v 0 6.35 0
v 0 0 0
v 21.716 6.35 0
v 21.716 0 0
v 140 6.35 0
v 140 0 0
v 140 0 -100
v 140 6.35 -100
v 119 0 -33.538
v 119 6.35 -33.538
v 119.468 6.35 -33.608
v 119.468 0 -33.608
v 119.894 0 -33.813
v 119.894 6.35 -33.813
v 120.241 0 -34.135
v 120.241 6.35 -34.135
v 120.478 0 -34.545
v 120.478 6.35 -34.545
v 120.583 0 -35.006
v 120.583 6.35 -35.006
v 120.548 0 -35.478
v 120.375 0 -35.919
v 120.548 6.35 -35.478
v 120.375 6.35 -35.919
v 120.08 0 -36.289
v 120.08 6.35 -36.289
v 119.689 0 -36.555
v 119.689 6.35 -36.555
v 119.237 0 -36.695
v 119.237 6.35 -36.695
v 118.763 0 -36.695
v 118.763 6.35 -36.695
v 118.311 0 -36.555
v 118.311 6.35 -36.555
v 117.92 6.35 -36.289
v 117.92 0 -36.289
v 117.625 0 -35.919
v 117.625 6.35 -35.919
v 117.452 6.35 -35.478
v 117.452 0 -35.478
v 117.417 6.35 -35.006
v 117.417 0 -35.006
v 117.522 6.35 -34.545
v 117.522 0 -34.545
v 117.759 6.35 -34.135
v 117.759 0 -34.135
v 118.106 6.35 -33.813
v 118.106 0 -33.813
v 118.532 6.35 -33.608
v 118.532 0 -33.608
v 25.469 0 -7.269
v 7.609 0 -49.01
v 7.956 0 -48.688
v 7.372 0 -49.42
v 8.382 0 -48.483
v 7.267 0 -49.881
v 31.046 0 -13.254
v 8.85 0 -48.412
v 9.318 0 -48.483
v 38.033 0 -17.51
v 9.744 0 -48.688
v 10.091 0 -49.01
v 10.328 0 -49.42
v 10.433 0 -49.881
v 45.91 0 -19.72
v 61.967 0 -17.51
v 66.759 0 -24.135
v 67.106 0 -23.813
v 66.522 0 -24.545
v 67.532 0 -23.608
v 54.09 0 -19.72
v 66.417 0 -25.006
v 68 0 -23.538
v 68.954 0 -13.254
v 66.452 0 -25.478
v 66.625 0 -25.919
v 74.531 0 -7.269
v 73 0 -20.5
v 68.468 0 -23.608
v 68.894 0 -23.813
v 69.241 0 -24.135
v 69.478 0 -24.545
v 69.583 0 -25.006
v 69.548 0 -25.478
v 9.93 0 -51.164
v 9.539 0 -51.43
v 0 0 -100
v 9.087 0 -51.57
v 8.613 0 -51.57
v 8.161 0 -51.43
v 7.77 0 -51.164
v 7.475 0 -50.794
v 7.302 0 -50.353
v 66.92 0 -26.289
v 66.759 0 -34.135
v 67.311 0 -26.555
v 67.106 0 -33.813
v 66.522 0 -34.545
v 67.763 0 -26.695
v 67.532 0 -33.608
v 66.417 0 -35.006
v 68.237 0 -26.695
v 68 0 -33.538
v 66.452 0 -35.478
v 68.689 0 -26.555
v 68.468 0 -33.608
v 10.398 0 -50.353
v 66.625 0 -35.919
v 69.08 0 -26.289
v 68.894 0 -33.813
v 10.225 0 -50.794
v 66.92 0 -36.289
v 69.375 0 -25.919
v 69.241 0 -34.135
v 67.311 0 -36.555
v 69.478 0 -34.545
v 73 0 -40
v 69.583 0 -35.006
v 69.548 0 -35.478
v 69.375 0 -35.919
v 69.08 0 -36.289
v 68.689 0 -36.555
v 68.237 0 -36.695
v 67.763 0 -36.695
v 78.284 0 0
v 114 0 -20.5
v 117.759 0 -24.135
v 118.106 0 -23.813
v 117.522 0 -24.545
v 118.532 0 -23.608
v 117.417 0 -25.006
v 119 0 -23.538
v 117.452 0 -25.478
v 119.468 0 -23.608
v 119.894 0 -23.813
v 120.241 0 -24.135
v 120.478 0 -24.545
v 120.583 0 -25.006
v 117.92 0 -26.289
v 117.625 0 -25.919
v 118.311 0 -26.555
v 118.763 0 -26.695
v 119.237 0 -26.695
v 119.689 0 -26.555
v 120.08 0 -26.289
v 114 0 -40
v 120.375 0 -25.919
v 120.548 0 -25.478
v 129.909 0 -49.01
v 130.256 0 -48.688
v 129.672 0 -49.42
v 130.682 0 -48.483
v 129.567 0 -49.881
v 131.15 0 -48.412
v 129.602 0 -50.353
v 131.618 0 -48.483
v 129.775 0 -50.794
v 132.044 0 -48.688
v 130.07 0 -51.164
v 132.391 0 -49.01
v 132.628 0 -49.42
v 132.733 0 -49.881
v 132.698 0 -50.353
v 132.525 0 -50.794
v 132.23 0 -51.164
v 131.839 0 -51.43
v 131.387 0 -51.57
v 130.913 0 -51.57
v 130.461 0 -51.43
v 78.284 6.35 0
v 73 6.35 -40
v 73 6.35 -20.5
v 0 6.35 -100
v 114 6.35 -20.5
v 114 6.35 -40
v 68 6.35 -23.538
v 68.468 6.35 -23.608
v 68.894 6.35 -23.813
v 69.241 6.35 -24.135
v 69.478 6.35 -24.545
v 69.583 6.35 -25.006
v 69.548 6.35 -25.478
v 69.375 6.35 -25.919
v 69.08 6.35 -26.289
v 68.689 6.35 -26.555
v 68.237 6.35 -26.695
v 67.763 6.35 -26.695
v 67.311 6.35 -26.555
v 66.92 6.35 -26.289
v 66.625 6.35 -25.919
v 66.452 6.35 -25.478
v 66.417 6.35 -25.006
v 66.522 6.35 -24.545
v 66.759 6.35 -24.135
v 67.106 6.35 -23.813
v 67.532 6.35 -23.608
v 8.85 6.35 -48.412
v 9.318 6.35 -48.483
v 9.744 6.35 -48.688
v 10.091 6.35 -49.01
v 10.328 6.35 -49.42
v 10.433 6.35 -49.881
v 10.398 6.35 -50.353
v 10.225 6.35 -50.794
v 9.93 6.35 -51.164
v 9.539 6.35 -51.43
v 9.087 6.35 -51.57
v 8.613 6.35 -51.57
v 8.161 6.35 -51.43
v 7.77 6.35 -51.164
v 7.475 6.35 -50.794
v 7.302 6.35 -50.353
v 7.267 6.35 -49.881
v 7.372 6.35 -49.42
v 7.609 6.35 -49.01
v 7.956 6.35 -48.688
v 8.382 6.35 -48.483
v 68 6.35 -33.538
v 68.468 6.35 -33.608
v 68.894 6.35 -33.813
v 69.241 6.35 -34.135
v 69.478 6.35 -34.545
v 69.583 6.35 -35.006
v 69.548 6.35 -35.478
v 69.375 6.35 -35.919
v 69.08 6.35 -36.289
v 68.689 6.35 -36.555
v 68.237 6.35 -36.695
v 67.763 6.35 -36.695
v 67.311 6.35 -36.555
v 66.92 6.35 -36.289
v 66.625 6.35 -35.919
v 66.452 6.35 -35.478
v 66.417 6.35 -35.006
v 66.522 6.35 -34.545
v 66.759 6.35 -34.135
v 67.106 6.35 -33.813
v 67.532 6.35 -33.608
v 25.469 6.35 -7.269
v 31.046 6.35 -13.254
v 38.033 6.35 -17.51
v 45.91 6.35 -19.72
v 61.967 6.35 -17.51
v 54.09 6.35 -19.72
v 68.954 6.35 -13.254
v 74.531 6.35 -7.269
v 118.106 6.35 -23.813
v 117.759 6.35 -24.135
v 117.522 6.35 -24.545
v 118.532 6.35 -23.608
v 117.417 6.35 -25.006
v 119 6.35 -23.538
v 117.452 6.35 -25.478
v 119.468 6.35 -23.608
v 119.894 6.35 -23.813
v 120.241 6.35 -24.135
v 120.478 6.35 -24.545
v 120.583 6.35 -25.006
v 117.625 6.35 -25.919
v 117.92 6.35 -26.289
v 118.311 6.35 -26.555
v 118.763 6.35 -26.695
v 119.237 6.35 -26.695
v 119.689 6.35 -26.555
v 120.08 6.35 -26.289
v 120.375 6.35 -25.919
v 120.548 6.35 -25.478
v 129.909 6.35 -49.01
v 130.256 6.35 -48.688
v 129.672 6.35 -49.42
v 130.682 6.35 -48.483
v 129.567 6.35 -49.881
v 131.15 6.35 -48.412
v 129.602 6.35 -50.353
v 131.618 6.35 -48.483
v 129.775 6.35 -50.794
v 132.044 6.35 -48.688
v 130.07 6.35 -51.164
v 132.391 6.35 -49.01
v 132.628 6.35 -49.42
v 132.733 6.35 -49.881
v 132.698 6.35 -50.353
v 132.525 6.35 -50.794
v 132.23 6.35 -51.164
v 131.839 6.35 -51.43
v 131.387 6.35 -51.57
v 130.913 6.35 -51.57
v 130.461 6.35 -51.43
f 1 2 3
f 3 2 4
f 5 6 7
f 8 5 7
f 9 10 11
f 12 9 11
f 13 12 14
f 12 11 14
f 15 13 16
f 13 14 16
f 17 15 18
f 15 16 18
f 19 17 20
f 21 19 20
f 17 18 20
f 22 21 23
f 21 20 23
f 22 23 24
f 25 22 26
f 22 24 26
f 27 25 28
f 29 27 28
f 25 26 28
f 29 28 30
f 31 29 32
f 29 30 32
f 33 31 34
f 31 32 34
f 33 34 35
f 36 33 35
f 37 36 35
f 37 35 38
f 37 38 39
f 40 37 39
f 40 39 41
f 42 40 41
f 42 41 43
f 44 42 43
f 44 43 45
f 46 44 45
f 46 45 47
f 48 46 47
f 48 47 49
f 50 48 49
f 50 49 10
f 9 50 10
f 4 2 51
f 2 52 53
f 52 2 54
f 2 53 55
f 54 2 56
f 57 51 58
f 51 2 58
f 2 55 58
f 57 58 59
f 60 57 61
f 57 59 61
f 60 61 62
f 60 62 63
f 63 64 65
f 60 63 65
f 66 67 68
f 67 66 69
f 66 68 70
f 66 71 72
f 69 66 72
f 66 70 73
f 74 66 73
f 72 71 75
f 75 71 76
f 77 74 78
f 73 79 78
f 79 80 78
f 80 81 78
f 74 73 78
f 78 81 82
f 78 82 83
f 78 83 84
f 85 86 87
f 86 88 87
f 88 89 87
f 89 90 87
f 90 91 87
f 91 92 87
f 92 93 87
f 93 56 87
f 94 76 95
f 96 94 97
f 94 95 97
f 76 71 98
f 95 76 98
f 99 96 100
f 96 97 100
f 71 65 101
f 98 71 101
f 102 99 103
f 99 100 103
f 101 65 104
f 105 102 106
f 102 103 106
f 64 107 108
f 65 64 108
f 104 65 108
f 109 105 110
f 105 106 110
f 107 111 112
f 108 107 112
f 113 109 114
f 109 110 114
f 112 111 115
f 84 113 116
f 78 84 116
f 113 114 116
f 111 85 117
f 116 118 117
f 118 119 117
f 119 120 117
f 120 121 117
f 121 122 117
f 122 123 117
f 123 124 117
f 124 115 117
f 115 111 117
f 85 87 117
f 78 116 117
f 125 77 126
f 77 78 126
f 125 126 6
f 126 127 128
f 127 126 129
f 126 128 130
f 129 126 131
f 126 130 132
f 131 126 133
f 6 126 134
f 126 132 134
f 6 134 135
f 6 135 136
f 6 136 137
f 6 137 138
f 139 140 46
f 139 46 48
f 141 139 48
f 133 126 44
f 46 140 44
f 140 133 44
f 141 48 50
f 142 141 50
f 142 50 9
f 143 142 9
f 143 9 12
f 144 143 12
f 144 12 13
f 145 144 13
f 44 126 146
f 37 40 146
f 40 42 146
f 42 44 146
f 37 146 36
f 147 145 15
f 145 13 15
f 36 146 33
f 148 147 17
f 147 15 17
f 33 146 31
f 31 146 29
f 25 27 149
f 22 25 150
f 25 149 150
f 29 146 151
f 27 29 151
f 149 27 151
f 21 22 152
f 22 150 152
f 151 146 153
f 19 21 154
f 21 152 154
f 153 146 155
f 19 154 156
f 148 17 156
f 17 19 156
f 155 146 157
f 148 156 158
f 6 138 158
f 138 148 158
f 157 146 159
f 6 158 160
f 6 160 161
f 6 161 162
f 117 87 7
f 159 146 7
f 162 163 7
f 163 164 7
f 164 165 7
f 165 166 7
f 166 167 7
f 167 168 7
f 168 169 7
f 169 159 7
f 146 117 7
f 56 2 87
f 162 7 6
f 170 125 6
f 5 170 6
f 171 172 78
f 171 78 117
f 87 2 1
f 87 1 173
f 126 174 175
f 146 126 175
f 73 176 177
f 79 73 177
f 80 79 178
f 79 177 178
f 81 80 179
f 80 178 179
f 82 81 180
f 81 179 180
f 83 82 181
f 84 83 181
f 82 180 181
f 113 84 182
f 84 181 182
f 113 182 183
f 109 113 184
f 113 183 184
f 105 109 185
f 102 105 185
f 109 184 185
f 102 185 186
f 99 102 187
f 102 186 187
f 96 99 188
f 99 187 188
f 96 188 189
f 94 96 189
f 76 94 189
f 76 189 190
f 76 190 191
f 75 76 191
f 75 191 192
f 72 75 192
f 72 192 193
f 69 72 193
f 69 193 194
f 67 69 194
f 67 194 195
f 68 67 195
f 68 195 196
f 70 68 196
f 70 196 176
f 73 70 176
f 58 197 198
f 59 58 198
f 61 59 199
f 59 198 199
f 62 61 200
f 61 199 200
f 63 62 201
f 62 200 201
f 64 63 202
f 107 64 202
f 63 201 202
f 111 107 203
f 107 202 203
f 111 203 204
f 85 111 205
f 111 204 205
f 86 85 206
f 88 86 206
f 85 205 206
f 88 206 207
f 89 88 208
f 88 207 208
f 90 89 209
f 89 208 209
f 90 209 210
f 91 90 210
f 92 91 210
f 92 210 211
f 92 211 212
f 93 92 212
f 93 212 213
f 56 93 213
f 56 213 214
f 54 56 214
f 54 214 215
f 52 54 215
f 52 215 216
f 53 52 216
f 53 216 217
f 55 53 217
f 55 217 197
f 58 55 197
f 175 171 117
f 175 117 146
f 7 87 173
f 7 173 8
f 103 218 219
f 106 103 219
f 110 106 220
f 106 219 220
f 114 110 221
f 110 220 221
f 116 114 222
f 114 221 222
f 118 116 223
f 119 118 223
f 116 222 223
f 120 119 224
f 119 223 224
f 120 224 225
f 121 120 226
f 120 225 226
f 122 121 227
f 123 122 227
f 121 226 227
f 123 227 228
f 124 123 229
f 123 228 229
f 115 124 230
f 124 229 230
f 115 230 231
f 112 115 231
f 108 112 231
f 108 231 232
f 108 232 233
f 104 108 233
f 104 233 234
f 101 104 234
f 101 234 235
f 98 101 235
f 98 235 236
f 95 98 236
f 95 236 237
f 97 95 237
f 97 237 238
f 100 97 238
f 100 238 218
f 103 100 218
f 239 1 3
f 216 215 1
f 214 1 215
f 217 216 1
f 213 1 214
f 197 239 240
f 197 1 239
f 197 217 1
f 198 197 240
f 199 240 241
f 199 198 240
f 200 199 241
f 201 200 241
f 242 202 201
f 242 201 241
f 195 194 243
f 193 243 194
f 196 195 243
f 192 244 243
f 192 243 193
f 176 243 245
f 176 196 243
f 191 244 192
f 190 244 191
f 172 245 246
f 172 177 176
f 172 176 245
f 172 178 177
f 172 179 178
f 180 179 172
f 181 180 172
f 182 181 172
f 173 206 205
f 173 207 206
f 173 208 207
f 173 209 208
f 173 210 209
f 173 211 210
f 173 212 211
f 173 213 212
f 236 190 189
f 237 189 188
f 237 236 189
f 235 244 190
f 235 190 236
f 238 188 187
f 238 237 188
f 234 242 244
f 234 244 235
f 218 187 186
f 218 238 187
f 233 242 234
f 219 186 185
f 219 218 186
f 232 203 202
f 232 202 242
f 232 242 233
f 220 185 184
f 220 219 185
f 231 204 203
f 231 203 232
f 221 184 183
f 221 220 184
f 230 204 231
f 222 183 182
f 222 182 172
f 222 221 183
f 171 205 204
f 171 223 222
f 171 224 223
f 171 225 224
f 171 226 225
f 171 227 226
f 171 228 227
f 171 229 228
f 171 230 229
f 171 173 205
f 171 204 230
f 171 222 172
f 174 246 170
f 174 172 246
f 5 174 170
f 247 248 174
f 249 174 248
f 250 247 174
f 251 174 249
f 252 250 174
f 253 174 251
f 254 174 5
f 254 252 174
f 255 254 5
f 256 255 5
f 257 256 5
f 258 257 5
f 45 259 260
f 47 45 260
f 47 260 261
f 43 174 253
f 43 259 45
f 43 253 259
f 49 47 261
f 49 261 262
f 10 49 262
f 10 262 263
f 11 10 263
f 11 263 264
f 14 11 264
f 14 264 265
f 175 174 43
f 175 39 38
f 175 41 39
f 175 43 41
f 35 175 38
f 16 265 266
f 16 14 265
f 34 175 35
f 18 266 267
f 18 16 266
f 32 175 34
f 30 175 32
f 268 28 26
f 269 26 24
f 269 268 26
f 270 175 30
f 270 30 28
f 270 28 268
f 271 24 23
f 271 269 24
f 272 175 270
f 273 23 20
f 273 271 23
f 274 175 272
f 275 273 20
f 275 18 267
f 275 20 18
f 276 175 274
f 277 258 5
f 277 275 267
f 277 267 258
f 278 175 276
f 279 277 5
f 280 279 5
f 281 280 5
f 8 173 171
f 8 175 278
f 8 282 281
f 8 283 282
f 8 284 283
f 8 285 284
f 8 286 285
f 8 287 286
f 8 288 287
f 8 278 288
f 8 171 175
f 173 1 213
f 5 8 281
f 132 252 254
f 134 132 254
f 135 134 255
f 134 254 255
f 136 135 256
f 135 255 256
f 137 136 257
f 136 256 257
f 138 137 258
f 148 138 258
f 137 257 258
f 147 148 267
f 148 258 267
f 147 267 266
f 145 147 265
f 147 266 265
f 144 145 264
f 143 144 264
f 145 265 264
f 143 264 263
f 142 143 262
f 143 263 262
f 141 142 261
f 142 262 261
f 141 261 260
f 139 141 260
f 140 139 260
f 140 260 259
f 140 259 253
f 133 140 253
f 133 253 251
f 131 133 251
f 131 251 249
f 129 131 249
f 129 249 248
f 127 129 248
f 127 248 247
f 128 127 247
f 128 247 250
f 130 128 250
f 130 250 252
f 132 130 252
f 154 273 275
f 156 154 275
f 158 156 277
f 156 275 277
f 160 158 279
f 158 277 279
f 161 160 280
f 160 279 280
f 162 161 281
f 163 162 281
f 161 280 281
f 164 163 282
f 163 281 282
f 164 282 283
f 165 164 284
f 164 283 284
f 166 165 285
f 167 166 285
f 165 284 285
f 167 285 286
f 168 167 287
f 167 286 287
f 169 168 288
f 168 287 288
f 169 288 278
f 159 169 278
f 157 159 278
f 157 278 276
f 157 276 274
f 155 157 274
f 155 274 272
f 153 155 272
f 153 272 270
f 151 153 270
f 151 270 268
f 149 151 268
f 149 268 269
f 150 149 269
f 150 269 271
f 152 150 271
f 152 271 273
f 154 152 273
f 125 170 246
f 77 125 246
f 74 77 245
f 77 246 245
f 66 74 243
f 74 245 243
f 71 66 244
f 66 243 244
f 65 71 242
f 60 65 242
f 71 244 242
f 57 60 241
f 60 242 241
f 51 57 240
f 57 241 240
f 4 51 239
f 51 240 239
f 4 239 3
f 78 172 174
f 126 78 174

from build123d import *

# Parameters (mm, degrees)
SKETCH1_W           = 140
SKETCH1_H           = 100
BOSS_EXTRUDE1_DEPTH = 6.35
SKETCH2_W           = 41
SKETCH2_H           = 19.5
CUT_EXTRUDE1_DEPTH  = 10
SKETCH3_R           = 30
CUT_EXTRUDE2_DEPTH  = 10
SKETCH4_R           = 1.5875
CUT_EXTRUDE3_DEPTH  = 10


with BuildPart() as part:
    # Sketch1 → Boss-Extrude1 (new body)
    with BuildSketch(Plane(origin=(0, 0, 0), x_dir=(1, 0, 0), z_dir=(0, 1, 0))):
        with Locations((70, 50)):
            Rectangle(SKETCH1_W, SKETCH1_H)
    extrude(amount=BOSS_EXTRUDE1_DEPTH)

    # Sketch2 → Cut-Extrude1 (cut)
    with BuildSketch(Plane(origin=(0, 6.35, 0), x_dir=(1, 0, 0), z_dir=(0, 1, 0))):
        with Locations((93.5, 30.25)):
            Rectangle(SKETCH2_W, SKETCH2_H)
    extrude(amount=-CUT_EXTRUDE1_DEPTH, mode=Mode.SUBTRACT)

    # Sketch3 → Cut-Extrude2 (cut)
    with BuildSketch(Plane(origin=(0, 6.35, 0), x_dir=(1, 0, 0), z_dir=(0, 1, 0))):
        with Locations((50, -10)):
            Circle(SKETCH3_R)
    extrude(amount=-CUT_EXTRUDE2_DEPTH, mode=Mode.SUBTRACT)

    # Sketch4 → Cut-Extrude3 (cut)
    with BuildSketch(Plane(origin=(0, 6.35, 0), x_dir=(1, 0, 0), z_dir=(0, 1, 0))):
        with Locations(Location((131.15, 50, 0), (0, 0, 270))):
            Circle(SKETCH4_R)
        with Locations(Location((8.85, 50, 0), (0, 0, 270))):
            Circle(SKETCH4_R)
        with Locations(Location((68, 25.125, 0), (0, 0, 270))):
            Circle(SKETCH4_R)
        with Locations(Location((119, 35.125, 0), (0, 0, 270))):
            Circle(SKETCH4_R)
        with Locations(Location((68, 35.125, 0), (0, 0, 270))):
            Circle(SKETCH4_R)
        with Locations(Location((119, 25.125, 0), (0, 0, 270))):
            Circle(SKETCH4_R)
    extrude(amount=-CUT_EXTRUDE3_DEPTH, mode=Mode.SUBTRACT)


solid = part.part
